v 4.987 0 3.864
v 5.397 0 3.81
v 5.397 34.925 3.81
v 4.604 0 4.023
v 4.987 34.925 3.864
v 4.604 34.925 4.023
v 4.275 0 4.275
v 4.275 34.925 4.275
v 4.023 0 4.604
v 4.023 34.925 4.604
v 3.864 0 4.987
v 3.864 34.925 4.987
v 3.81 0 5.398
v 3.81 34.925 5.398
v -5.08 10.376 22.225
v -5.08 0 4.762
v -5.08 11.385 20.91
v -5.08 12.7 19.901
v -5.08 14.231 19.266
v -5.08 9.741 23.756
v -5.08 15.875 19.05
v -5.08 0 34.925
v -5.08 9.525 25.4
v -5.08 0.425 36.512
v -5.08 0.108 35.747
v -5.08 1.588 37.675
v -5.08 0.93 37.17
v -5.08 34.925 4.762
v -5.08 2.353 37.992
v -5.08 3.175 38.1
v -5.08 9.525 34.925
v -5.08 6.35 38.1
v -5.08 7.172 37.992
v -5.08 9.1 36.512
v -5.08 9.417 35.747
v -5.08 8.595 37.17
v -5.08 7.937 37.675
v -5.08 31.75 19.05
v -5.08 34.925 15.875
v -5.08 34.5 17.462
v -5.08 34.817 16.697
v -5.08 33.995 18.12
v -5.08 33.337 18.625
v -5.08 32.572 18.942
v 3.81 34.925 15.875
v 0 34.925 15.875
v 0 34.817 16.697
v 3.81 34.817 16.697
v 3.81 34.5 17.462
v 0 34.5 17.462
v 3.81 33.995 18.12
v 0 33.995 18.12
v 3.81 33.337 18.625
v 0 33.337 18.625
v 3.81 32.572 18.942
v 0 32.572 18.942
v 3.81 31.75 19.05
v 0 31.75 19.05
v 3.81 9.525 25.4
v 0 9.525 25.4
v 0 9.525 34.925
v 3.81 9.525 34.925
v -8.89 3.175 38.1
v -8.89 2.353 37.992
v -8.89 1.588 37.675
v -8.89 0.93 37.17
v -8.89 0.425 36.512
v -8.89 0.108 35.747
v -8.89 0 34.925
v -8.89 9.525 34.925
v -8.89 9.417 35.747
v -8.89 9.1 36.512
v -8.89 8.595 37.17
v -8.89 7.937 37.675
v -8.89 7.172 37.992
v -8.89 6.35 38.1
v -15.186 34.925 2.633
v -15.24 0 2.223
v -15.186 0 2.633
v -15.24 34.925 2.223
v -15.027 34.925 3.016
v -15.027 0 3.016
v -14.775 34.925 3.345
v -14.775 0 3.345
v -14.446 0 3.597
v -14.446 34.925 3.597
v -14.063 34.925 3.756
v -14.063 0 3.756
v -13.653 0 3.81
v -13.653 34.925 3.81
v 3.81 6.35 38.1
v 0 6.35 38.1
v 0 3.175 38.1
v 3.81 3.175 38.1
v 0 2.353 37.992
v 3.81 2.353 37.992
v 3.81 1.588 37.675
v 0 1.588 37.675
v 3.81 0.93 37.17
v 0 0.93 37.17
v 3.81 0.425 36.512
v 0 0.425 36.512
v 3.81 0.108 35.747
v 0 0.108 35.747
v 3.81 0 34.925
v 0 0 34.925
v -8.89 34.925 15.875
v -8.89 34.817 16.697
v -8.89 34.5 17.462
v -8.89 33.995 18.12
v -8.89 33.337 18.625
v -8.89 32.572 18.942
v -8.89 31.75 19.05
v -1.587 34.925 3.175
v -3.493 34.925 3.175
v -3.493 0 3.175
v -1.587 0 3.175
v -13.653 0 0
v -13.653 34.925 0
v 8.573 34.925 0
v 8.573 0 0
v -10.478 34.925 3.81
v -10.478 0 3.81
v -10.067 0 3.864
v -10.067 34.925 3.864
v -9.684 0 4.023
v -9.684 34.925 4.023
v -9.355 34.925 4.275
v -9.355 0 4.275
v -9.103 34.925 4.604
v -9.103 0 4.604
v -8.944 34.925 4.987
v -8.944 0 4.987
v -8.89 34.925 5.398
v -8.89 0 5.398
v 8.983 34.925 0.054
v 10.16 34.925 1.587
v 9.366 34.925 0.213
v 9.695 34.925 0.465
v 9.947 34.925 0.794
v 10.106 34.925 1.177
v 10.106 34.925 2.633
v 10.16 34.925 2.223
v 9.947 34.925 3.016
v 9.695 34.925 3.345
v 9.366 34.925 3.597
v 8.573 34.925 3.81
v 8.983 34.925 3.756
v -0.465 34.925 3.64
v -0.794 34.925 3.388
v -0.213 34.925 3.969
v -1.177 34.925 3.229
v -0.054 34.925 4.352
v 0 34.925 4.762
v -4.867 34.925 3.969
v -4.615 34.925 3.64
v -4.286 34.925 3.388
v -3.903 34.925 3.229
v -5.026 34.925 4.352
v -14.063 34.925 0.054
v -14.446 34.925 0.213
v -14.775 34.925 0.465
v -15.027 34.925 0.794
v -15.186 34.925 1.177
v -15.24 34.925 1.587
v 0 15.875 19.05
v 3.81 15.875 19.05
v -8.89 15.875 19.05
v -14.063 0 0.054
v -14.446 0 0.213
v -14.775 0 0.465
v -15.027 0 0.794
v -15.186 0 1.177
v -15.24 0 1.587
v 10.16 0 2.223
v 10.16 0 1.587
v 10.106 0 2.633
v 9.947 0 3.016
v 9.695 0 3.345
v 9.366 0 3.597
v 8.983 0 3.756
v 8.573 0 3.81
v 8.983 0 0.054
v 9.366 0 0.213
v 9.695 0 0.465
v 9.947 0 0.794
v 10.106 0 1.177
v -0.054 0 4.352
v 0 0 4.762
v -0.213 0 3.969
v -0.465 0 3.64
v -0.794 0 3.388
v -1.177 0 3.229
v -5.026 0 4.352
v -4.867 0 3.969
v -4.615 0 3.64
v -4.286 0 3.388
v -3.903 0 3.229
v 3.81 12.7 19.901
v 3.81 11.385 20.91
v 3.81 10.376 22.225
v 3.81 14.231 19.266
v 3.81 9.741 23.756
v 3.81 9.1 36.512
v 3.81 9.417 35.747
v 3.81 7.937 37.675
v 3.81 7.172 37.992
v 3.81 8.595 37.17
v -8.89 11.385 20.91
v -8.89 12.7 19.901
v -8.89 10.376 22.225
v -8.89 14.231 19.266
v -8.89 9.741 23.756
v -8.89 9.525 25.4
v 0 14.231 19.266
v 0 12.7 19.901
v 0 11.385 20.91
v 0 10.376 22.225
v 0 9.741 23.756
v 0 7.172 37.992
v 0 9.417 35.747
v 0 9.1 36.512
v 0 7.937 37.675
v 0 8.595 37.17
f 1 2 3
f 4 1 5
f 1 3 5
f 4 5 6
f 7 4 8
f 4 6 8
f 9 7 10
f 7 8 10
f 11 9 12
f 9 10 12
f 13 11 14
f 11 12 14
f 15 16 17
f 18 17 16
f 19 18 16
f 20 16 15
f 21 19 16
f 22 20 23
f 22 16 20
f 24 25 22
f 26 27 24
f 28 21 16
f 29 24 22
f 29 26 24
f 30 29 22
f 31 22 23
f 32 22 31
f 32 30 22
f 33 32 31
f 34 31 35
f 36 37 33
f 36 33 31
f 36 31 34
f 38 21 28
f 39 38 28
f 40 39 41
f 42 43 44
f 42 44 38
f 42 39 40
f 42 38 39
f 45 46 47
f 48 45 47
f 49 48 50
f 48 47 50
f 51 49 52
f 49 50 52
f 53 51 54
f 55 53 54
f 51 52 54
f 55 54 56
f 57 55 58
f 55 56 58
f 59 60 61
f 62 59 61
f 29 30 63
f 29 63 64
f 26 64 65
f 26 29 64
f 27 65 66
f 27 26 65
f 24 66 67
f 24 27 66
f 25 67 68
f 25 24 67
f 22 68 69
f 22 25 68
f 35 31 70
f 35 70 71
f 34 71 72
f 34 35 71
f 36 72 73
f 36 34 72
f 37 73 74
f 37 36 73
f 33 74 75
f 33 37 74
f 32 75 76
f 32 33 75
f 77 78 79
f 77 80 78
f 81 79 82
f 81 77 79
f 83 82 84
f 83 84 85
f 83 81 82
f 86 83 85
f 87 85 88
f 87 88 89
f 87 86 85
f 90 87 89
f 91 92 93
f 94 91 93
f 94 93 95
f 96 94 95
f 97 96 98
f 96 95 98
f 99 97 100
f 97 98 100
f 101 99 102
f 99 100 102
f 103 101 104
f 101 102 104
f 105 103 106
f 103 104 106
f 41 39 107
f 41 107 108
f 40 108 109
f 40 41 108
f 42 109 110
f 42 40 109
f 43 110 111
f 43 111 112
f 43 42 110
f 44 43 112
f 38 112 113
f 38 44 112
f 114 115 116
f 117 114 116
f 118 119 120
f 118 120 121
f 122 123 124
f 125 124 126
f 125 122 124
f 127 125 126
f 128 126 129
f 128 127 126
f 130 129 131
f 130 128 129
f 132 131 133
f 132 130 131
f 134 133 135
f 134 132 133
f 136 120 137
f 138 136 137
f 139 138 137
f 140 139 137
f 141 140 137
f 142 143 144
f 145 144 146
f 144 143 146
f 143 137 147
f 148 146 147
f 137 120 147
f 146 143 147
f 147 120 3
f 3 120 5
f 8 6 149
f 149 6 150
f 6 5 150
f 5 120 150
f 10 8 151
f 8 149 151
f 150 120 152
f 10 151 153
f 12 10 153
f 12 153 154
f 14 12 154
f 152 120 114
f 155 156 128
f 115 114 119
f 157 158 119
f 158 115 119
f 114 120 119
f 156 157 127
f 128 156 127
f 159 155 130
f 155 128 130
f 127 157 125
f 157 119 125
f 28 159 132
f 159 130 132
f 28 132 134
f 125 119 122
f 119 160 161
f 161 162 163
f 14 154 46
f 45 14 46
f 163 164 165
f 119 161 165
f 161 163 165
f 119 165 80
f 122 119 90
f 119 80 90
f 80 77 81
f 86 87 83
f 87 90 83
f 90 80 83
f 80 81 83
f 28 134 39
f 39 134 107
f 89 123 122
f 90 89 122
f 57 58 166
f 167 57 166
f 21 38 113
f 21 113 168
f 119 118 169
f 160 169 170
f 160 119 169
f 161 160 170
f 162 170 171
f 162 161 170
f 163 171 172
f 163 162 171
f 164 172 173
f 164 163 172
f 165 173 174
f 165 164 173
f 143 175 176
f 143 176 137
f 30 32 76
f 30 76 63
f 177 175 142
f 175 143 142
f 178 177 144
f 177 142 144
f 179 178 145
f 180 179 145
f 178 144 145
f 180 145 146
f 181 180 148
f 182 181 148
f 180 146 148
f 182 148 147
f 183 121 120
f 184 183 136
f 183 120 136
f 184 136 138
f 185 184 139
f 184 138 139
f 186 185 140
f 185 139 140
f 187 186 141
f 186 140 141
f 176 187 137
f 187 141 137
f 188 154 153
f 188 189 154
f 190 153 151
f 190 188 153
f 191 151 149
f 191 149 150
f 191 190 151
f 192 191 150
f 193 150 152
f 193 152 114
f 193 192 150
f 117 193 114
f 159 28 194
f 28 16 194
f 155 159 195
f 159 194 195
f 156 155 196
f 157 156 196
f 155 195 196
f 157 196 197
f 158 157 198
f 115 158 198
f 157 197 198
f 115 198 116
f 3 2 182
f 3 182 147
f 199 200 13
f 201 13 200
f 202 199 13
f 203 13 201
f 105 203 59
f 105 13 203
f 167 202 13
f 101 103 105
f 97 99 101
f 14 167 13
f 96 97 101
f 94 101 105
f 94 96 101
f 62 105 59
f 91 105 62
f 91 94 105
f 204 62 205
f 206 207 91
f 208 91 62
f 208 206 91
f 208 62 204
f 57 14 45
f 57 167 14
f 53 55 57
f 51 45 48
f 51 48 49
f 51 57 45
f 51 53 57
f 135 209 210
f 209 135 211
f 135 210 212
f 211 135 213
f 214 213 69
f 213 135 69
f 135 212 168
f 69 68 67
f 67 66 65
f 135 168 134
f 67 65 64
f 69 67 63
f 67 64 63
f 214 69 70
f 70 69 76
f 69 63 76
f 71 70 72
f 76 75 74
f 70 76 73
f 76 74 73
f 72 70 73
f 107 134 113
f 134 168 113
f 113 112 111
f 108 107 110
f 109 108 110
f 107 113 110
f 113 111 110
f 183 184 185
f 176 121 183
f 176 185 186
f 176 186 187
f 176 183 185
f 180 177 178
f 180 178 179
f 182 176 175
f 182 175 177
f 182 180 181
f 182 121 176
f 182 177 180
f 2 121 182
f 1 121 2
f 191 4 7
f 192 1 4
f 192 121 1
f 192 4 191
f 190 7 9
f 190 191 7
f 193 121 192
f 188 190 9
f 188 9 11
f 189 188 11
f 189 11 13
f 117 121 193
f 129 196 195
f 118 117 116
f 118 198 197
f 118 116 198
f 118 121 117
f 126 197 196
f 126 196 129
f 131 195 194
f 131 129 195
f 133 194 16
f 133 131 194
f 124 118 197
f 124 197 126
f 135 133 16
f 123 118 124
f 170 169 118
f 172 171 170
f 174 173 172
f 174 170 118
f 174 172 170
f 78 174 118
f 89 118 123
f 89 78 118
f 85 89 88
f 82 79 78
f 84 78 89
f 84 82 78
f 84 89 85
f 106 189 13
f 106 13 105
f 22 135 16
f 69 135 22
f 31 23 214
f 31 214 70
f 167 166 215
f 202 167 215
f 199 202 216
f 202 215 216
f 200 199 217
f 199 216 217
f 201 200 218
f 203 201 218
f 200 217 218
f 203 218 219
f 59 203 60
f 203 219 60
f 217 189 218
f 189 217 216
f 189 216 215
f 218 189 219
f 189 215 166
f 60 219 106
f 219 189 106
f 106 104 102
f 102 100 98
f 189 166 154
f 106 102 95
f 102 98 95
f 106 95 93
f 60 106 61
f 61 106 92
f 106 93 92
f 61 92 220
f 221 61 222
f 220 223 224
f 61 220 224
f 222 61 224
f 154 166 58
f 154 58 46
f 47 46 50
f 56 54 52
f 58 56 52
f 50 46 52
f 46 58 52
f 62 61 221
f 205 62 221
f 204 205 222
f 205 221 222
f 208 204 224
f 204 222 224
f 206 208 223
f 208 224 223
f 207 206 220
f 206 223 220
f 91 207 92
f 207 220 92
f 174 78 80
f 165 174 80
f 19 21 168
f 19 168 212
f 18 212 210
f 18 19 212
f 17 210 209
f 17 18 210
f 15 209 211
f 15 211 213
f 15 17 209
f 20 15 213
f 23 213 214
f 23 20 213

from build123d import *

# Parameters (mm, degrees)
F1_DEPTH = 3.81
F2_W     = 34.925
F2_H     = 3.81
F3_DEPTH = 6.35
F4_W     = 34.925
F4_H     = 3.175
F5_DEPTH = 2.54
F6_R     = 1.5875


with BuildPart() as f1:
    # F0 (on Right) → F1 (new body)
    with BuildSketch(Plane.YZ):
        with BuildLine():
            Line((0, 34.925), (0, 0))
            Line((0, 0), (34.925, 0))
            Line((34.925, 0), (34.925, 15.875))
            ThreePointArc((34.925, 15.875), (33.995064, 18.120064), (31.75, 19.05))
            Line((31.75, 19.05), (15.875, 19.05))
            ThreePointArc((15.875, 19.05), (11.384872, 20.909872), (9.525, 25.4))
            Line((9.525, 25.4), (9.525, 34.925))
            ThreePointArc((9.525, 34.925), (8.595064, 37.170064), (6.35, 38.1))
            Line((6.35, 38.1), (3.175, 38.1))
            ThreePointArc((3.175, 38.1), (0.929936, 37.170064), (0, 34.925))
        make_face()
    extrude(amount=F1_DEPTH)

    # F2 (on face) → F3 (join)
    with BuildSketch(Plane.YZ.offset(3.81)):
        with Locations((17.4625, 1.905)):
            Rectangle(F2_W, F2_H)
    extrude(amount=F3_DEPTH)

    # F4 (on face) → F5 (join)
    with BuildSketch(Plane(origin=(0, 0, 0), x_dir=(0, -1, 0), z_dir=(-1, 0, 0))):
        with Locations((-17.4625, 1.5875)):
            Rectangle(F4_W, F4_H)
    extrude(amount=F5_DEPTH)

    # F6
    f6_edges = [f1.edges().sort_by_distance(p)[0] for p in [
        (3.81, 17.4625, 3.81),
        (10.16, 17.4625, 3.81),
        (0, 17.4625, 3.175),
        (10.16, 17.4625, 0),
    ]]
    fillet(f6_edges, radius=F6_R)

    # F7: F1 across face


with BuildPart() as f1_1:
    add(f1.part)
    add(f1.part.mirror(Plane(origin=(-2.54, 17.4625, 1.5875), x_dir=(0, -1, 0), z_dir=(-1, 0, 0))))


solid = f1_1.part
